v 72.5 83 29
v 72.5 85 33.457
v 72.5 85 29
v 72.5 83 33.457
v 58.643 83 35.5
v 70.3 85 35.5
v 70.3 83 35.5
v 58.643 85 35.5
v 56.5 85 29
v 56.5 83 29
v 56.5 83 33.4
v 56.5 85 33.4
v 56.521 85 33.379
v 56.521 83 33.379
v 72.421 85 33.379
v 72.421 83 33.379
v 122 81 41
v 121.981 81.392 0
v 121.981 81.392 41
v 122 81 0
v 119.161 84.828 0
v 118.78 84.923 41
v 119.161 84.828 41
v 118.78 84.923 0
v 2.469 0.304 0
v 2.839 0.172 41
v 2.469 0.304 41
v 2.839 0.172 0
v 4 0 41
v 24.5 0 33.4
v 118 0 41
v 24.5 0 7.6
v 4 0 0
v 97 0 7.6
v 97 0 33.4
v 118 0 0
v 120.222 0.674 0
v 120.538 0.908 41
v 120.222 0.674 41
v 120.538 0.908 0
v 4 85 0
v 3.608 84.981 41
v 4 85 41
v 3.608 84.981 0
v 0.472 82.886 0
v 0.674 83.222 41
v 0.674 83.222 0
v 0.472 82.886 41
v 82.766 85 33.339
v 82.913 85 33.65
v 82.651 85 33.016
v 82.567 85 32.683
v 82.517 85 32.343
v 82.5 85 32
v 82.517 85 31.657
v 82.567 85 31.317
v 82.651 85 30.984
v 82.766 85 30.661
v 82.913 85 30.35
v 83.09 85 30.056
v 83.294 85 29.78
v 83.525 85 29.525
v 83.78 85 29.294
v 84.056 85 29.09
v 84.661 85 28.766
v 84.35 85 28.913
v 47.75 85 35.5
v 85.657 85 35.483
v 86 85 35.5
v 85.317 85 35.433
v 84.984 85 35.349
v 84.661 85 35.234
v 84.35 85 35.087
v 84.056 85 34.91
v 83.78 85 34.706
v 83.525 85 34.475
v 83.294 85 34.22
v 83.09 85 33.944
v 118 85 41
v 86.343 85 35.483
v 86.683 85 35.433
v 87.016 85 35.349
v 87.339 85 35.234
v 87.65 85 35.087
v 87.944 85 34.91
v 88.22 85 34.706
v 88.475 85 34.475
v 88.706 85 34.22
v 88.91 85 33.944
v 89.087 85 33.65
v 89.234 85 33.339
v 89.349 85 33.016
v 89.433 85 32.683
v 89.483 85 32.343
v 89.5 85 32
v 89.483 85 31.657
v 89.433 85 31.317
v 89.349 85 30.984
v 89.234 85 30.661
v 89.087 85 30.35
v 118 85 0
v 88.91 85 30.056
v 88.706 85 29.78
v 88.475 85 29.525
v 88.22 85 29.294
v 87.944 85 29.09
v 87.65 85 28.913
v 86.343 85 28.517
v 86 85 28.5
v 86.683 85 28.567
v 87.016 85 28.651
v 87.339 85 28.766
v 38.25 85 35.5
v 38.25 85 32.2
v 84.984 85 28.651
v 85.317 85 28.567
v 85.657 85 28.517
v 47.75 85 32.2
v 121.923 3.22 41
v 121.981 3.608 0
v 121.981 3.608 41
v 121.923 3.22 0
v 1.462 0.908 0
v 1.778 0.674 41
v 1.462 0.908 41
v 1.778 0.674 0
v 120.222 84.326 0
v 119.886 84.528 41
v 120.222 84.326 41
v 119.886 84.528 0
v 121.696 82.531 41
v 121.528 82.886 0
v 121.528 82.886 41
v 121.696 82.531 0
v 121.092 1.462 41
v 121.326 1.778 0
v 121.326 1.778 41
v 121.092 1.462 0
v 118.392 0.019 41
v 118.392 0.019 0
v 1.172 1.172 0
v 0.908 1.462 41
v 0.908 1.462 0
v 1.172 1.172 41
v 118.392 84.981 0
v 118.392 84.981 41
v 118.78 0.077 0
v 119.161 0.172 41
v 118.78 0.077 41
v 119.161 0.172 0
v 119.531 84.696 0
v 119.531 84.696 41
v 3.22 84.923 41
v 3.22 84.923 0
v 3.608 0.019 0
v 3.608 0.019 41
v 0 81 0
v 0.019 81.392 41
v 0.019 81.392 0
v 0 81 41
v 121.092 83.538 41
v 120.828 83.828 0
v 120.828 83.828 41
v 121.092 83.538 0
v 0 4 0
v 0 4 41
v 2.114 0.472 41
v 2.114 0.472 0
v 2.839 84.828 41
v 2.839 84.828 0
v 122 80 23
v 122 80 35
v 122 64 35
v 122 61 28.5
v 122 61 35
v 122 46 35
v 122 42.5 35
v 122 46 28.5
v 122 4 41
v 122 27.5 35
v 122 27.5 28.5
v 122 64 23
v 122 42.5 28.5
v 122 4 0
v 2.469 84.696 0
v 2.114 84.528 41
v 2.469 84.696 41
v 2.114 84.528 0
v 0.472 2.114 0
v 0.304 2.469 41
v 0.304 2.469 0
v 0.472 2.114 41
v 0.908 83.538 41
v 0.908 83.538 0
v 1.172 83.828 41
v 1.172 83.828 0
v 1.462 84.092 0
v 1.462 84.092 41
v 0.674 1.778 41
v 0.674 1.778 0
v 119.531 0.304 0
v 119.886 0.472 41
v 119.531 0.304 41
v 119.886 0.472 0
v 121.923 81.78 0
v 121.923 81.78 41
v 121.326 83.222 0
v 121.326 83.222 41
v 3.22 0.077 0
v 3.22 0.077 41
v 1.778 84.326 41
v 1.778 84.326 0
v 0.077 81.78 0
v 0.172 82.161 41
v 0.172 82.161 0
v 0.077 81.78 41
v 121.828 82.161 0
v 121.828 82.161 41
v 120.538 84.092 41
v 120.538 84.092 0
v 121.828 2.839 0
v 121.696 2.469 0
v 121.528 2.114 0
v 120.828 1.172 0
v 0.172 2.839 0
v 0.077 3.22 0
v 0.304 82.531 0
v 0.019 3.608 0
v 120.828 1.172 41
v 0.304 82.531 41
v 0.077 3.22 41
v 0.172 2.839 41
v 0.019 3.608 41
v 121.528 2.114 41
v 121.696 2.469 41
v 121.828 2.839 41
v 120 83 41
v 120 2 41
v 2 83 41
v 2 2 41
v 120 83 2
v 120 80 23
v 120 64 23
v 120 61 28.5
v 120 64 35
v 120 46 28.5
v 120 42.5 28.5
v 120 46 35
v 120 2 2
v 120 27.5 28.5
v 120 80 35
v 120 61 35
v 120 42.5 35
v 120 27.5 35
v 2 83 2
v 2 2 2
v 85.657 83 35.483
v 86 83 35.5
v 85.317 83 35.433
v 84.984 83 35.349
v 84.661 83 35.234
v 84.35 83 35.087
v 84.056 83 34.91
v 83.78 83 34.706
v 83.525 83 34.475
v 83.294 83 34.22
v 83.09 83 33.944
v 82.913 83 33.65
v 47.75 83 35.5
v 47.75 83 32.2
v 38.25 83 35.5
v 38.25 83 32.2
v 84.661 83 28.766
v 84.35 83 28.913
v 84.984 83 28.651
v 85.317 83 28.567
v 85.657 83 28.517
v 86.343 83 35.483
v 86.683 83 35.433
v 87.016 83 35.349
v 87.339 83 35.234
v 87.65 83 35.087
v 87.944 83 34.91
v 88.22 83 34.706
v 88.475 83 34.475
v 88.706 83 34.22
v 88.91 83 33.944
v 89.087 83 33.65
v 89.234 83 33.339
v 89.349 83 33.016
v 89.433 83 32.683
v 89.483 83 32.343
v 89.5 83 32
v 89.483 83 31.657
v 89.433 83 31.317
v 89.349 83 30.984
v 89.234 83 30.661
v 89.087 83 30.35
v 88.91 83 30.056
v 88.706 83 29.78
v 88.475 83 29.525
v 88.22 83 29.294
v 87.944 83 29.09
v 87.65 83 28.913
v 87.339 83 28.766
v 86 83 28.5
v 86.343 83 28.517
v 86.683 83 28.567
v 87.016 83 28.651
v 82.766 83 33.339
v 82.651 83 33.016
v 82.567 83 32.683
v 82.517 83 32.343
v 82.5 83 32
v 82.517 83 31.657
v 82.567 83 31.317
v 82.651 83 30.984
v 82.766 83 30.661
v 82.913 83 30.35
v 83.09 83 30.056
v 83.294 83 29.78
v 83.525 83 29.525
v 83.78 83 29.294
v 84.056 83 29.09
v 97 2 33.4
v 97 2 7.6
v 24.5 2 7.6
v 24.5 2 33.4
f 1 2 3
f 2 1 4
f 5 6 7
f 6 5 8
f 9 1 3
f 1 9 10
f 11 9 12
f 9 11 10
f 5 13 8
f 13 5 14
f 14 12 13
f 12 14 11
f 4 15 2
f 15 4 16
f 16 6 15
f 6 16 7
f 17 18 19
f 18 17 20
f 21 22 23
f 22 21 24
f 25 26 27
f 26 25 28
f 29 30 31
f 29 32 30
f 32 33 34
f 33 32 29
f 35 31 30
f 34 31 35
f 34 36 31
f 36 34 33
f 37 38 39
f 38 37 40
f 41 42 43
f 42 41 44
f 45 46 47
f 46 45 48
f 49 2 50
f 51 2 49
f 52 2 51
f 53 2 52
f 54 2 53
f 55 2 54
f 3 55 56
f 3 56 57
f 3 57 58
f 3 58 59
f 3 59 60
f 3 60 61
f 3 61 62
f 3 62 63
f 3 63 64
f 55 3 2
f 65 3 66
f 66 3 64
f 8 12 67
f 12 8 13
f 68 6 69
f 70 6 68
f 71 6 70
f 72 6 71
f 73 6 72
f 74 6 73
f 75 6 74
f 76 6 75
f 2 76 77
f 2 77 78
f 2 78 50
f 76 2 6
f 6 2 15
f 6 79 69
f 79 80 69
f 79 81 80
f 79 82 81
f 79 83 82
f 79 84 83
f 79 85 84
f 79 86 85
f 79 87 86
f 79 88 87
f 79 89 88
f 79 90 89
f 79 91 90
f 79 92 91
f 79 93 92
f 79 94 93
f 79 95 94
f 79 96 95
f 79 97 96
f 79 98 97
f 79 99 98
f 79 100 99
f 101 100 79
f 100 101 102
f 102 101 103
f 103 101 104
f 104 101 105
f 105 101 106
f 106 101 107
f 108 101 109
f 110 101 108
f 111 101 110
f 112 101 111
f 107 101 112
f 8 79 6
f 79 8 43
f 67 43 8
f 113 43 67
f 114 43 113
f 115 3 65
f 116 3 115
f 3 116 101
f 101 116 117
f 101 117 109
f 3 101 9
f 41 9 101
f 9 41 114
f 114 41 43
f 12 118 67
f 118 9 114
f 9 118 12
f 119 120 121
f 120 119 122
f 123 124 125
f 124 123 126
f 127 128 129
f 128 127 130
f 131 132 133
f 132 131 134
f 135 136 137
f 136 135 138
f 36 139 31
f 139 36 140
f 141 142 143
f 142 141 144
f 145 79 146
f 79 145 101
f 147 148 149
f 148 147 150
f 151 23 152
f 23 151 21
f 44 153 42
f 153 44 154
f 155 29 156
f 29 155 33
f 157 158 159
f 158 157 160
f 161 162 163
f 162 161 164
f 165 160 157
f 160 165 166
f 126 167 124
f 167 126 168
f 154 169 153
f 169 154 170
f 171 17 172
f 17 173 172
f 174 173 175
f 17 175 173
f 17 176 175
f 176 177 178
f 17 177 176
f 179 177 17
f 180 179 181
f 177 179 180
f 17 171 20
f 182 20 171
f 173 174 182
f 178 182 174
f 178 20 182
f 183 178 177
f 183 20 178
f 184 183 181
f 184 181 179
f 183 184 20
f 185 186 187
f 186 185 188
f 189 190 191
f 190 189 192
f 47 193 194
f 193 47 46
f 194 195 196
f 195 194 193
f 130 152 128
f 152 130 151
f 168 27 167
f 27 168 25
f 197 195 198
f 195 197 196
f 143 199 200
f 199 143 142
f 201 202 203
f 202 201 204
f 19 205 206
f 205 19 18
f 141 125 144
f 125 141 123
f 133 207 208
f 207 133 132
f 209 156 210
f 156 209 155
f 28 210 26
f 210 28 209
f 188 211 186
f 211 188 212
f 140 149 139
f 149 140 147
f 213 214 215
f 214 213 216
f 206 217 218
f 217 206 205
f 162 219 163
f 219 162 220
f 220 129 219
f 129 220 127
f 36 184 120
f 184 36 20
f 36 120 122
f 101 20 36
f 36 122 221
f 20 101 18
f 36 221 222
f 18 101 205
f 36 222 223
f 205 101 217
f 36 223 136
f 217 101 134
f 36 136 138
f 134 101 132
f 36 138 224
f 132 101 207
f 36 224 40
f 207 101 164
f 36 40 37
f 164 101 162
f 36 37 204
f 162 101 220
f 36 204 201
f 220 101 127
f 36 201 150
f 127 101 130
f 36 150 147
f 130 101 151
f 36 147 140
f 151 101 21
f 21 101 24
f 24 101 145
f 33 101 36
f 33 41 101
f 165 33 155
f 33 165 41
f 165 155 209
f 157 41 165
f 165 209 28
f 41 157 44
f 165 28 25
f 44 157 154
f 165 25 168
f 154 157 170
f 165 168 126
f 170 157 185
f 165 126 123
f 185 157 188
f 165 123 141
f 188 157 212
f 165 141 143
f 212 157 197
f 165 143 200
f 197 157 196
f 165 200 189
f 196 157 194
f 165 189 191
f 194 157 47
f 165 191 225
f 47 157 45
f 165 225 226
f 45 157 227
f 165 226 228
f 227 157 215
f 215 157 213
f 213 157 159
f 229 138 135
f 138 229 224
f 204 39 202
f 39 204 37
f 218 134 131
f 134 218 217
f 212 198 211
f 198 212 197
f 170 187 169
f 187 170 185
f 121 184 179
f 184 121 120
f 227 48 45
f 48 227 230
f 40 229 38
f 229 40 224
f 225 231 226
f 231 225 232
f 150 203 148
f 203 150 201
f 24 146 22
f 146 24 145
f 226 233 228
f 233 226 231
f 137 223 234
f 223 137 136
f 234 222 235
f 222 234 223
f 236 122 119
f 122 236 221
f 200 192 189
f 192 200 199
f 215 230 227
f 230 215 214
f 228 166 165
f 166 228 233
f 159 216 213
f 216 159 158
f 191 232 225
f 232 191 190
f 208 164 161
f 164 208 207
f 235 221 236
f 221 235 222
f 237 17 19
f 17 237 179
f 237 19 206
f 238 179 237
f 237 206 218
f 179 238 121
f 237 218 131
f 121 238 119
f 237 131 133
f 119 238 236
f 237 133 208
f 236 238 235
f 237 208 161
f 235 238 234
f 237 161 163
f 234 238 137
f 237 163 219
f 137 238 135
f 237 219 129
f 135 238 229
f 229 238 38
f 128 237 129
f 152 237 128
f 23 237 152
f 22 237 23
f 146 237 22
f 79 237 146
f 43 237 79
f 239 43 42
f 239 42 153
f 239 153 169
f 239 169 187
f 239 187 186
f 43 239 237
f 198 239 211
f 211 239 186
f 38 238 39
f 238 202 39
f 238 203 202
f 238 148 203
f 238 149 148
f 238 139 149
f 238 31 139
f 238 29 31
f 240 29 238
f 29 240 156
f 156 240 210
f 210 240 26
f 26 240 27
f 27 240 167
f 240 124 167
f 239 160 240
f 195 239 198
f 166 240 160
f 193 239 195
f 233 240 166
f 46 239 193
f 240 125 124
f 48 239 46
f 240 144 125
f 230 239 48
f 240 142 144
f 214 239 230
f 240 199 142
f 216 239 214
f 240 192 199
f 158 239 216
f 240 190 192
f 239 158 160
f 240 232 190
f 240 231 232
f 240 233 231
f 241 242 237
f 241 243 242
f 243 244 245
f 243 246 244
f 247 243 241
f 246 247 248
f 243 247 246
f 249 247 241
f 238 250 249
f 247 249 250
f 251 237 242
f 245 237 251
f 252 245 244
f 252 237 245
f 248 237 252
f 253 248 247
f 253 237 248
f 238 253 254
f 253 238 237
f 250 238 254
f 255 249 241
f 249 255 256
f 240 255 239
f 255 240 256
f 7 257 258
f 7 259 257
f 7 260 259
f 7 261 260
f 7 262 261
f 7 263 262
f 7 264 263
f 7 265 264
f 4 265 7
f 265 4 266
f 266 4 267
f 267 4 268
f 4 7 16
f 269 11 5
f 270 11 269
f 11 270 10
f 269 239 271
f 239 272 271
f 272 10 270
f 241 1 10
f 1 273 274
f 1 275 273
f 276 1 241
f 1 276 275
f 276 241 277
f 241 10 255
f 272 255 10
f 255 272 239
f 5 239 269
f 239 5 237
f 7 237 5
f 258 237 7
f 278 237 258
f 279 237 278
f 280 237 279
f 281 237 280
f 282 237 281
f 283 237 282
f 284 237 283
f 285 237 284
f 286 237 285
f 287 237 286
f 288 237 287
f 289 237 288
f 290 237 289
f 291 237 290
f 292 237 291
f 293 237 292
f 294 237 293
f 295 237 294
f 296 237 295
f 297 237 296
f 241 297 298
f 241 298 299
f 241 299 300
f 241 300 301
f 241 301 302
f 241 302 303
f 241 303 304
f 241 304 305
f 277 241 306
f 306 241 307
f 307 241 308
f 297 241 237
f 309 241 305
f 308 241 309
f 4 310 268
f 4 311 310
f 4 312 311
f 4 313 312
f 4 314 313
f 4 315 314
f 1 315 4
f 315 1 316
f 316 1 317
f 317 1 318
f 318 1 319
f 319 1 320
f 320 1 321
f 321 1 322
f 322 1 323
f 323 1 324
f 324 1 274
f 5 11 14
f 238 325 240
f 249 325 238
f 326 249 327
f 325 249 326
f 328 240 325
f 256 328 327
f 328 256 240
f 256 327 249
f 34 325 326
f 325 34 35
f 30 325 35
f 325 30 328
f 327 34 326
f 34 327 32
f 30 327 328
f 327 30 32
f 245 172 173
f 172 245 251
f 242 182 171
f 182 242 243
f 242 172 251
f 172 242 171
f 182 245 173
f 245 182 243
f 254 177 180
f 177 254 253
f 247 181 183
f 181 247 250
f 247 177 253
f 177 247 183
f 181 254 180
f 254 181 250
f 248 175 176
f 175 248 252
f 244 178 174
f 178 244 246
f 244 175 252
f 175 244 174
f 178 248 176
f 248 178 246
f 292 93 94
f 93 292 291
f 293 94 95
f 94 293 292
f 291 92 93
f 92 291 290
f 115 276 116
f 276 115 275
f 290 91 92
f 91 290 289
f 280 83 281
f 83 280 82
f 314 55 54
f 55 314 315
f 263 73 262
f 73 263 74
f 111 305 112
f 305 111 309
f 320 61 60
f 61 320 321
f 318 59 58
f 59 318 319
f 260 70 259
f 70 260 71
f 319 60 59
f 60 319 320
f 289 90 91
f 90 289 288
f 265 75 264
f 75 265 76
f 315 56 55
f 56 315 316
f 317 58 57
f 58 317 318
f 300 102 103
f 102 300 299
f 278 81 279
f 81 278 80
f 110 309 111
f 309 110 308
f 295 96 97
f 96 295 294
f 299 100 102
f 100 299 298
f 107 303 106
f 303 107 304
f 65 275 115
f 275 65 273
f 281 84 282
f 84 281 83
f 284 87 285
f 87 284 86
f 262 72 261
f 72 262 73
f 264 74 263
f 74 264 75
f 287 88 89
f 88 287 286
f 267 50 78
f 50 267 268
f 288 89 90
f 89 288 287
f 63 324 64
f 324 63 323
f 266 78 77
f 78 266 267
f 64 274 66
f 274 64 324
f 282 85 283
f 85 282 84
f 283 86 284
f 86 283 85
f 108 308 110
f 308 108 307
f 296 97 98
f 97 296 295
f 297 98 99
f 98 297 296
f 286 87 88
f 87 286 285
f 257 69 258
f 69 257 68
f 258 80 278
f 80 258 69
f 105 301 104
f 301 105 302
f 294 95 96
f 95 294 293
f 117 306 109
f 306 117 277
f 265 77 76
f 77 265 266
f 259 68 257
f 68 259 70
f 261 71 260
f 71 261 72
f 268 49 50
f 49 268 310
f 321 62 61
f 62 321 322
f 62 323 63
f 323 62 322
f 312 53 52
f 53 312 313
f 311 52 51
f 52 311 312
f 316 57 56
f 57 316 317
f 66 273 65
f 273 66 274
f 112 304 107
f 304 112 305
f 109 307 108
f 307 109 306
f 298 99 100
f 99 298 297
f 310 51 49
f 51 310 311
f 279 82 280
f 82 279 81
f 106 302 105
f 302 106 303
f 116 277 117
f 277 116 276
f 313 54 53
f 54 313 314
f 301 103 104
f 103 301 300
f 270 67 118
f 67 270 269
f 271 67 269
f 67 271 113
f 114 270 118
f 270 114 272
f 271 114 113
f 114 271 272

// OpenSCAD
//number of fragments
$fn=64;

difference(){
    // outer shell
    roundedcube(122,85,41,4);

    // internal cavity
    translate([2,2,2]){
        cube([118,81,40]);
    }

    // oled window
    translate([24.50,-1,7.60]){
        cube([72.50,4,25.80]);
    }

    // ethernet
    translate([119,64,23]){
        cube([4,16,12]) ;
    }

    // usb ports
    translate([119,27.50,28.50]){
        cube([4,15,6.50]);
    }
    translate([119,46,28.50]){
        cube([4,15,6.50]);
    }

    // A/V jack
    translate([86,86,32]){
        rotate([90,0,0]){
            cylinder(h=4,r=3.5);
        }
    }

    // hdmi
    translate([56.50,82,29]){
        difference(){
            cube([16,4,6.50]);
            translate([-2.10,0,6.50]){
                rotate([0,45,0]){
                    cube([3,4,3]);
                }
            }
            translate([13.8,0,6.50]){
                rotate([0,45,0]){
                    cube([3,4,3]);
                }
            }
        }
    }

    // power connector
    translate([38.25,82,32.20]){
        cube([9.50,4,3.30]) ;
    }
}

module roundedcube(xdim,ydim,zdim,rdim){
    hull(){
        translate([rdim,rdim,0])cylinder(r=rdim,h=zdim);
        translate([xdim-rdim,rdim,0])cylinder(r=rdim,h=zdim);
        translate([rdim,ydim-rdim,0])cylinder(r=rdim,h=zdim);
        translate([xdim-rdim,ydim-rdim,0])cylinder(r=rdim,h=zdim);
    }
}
